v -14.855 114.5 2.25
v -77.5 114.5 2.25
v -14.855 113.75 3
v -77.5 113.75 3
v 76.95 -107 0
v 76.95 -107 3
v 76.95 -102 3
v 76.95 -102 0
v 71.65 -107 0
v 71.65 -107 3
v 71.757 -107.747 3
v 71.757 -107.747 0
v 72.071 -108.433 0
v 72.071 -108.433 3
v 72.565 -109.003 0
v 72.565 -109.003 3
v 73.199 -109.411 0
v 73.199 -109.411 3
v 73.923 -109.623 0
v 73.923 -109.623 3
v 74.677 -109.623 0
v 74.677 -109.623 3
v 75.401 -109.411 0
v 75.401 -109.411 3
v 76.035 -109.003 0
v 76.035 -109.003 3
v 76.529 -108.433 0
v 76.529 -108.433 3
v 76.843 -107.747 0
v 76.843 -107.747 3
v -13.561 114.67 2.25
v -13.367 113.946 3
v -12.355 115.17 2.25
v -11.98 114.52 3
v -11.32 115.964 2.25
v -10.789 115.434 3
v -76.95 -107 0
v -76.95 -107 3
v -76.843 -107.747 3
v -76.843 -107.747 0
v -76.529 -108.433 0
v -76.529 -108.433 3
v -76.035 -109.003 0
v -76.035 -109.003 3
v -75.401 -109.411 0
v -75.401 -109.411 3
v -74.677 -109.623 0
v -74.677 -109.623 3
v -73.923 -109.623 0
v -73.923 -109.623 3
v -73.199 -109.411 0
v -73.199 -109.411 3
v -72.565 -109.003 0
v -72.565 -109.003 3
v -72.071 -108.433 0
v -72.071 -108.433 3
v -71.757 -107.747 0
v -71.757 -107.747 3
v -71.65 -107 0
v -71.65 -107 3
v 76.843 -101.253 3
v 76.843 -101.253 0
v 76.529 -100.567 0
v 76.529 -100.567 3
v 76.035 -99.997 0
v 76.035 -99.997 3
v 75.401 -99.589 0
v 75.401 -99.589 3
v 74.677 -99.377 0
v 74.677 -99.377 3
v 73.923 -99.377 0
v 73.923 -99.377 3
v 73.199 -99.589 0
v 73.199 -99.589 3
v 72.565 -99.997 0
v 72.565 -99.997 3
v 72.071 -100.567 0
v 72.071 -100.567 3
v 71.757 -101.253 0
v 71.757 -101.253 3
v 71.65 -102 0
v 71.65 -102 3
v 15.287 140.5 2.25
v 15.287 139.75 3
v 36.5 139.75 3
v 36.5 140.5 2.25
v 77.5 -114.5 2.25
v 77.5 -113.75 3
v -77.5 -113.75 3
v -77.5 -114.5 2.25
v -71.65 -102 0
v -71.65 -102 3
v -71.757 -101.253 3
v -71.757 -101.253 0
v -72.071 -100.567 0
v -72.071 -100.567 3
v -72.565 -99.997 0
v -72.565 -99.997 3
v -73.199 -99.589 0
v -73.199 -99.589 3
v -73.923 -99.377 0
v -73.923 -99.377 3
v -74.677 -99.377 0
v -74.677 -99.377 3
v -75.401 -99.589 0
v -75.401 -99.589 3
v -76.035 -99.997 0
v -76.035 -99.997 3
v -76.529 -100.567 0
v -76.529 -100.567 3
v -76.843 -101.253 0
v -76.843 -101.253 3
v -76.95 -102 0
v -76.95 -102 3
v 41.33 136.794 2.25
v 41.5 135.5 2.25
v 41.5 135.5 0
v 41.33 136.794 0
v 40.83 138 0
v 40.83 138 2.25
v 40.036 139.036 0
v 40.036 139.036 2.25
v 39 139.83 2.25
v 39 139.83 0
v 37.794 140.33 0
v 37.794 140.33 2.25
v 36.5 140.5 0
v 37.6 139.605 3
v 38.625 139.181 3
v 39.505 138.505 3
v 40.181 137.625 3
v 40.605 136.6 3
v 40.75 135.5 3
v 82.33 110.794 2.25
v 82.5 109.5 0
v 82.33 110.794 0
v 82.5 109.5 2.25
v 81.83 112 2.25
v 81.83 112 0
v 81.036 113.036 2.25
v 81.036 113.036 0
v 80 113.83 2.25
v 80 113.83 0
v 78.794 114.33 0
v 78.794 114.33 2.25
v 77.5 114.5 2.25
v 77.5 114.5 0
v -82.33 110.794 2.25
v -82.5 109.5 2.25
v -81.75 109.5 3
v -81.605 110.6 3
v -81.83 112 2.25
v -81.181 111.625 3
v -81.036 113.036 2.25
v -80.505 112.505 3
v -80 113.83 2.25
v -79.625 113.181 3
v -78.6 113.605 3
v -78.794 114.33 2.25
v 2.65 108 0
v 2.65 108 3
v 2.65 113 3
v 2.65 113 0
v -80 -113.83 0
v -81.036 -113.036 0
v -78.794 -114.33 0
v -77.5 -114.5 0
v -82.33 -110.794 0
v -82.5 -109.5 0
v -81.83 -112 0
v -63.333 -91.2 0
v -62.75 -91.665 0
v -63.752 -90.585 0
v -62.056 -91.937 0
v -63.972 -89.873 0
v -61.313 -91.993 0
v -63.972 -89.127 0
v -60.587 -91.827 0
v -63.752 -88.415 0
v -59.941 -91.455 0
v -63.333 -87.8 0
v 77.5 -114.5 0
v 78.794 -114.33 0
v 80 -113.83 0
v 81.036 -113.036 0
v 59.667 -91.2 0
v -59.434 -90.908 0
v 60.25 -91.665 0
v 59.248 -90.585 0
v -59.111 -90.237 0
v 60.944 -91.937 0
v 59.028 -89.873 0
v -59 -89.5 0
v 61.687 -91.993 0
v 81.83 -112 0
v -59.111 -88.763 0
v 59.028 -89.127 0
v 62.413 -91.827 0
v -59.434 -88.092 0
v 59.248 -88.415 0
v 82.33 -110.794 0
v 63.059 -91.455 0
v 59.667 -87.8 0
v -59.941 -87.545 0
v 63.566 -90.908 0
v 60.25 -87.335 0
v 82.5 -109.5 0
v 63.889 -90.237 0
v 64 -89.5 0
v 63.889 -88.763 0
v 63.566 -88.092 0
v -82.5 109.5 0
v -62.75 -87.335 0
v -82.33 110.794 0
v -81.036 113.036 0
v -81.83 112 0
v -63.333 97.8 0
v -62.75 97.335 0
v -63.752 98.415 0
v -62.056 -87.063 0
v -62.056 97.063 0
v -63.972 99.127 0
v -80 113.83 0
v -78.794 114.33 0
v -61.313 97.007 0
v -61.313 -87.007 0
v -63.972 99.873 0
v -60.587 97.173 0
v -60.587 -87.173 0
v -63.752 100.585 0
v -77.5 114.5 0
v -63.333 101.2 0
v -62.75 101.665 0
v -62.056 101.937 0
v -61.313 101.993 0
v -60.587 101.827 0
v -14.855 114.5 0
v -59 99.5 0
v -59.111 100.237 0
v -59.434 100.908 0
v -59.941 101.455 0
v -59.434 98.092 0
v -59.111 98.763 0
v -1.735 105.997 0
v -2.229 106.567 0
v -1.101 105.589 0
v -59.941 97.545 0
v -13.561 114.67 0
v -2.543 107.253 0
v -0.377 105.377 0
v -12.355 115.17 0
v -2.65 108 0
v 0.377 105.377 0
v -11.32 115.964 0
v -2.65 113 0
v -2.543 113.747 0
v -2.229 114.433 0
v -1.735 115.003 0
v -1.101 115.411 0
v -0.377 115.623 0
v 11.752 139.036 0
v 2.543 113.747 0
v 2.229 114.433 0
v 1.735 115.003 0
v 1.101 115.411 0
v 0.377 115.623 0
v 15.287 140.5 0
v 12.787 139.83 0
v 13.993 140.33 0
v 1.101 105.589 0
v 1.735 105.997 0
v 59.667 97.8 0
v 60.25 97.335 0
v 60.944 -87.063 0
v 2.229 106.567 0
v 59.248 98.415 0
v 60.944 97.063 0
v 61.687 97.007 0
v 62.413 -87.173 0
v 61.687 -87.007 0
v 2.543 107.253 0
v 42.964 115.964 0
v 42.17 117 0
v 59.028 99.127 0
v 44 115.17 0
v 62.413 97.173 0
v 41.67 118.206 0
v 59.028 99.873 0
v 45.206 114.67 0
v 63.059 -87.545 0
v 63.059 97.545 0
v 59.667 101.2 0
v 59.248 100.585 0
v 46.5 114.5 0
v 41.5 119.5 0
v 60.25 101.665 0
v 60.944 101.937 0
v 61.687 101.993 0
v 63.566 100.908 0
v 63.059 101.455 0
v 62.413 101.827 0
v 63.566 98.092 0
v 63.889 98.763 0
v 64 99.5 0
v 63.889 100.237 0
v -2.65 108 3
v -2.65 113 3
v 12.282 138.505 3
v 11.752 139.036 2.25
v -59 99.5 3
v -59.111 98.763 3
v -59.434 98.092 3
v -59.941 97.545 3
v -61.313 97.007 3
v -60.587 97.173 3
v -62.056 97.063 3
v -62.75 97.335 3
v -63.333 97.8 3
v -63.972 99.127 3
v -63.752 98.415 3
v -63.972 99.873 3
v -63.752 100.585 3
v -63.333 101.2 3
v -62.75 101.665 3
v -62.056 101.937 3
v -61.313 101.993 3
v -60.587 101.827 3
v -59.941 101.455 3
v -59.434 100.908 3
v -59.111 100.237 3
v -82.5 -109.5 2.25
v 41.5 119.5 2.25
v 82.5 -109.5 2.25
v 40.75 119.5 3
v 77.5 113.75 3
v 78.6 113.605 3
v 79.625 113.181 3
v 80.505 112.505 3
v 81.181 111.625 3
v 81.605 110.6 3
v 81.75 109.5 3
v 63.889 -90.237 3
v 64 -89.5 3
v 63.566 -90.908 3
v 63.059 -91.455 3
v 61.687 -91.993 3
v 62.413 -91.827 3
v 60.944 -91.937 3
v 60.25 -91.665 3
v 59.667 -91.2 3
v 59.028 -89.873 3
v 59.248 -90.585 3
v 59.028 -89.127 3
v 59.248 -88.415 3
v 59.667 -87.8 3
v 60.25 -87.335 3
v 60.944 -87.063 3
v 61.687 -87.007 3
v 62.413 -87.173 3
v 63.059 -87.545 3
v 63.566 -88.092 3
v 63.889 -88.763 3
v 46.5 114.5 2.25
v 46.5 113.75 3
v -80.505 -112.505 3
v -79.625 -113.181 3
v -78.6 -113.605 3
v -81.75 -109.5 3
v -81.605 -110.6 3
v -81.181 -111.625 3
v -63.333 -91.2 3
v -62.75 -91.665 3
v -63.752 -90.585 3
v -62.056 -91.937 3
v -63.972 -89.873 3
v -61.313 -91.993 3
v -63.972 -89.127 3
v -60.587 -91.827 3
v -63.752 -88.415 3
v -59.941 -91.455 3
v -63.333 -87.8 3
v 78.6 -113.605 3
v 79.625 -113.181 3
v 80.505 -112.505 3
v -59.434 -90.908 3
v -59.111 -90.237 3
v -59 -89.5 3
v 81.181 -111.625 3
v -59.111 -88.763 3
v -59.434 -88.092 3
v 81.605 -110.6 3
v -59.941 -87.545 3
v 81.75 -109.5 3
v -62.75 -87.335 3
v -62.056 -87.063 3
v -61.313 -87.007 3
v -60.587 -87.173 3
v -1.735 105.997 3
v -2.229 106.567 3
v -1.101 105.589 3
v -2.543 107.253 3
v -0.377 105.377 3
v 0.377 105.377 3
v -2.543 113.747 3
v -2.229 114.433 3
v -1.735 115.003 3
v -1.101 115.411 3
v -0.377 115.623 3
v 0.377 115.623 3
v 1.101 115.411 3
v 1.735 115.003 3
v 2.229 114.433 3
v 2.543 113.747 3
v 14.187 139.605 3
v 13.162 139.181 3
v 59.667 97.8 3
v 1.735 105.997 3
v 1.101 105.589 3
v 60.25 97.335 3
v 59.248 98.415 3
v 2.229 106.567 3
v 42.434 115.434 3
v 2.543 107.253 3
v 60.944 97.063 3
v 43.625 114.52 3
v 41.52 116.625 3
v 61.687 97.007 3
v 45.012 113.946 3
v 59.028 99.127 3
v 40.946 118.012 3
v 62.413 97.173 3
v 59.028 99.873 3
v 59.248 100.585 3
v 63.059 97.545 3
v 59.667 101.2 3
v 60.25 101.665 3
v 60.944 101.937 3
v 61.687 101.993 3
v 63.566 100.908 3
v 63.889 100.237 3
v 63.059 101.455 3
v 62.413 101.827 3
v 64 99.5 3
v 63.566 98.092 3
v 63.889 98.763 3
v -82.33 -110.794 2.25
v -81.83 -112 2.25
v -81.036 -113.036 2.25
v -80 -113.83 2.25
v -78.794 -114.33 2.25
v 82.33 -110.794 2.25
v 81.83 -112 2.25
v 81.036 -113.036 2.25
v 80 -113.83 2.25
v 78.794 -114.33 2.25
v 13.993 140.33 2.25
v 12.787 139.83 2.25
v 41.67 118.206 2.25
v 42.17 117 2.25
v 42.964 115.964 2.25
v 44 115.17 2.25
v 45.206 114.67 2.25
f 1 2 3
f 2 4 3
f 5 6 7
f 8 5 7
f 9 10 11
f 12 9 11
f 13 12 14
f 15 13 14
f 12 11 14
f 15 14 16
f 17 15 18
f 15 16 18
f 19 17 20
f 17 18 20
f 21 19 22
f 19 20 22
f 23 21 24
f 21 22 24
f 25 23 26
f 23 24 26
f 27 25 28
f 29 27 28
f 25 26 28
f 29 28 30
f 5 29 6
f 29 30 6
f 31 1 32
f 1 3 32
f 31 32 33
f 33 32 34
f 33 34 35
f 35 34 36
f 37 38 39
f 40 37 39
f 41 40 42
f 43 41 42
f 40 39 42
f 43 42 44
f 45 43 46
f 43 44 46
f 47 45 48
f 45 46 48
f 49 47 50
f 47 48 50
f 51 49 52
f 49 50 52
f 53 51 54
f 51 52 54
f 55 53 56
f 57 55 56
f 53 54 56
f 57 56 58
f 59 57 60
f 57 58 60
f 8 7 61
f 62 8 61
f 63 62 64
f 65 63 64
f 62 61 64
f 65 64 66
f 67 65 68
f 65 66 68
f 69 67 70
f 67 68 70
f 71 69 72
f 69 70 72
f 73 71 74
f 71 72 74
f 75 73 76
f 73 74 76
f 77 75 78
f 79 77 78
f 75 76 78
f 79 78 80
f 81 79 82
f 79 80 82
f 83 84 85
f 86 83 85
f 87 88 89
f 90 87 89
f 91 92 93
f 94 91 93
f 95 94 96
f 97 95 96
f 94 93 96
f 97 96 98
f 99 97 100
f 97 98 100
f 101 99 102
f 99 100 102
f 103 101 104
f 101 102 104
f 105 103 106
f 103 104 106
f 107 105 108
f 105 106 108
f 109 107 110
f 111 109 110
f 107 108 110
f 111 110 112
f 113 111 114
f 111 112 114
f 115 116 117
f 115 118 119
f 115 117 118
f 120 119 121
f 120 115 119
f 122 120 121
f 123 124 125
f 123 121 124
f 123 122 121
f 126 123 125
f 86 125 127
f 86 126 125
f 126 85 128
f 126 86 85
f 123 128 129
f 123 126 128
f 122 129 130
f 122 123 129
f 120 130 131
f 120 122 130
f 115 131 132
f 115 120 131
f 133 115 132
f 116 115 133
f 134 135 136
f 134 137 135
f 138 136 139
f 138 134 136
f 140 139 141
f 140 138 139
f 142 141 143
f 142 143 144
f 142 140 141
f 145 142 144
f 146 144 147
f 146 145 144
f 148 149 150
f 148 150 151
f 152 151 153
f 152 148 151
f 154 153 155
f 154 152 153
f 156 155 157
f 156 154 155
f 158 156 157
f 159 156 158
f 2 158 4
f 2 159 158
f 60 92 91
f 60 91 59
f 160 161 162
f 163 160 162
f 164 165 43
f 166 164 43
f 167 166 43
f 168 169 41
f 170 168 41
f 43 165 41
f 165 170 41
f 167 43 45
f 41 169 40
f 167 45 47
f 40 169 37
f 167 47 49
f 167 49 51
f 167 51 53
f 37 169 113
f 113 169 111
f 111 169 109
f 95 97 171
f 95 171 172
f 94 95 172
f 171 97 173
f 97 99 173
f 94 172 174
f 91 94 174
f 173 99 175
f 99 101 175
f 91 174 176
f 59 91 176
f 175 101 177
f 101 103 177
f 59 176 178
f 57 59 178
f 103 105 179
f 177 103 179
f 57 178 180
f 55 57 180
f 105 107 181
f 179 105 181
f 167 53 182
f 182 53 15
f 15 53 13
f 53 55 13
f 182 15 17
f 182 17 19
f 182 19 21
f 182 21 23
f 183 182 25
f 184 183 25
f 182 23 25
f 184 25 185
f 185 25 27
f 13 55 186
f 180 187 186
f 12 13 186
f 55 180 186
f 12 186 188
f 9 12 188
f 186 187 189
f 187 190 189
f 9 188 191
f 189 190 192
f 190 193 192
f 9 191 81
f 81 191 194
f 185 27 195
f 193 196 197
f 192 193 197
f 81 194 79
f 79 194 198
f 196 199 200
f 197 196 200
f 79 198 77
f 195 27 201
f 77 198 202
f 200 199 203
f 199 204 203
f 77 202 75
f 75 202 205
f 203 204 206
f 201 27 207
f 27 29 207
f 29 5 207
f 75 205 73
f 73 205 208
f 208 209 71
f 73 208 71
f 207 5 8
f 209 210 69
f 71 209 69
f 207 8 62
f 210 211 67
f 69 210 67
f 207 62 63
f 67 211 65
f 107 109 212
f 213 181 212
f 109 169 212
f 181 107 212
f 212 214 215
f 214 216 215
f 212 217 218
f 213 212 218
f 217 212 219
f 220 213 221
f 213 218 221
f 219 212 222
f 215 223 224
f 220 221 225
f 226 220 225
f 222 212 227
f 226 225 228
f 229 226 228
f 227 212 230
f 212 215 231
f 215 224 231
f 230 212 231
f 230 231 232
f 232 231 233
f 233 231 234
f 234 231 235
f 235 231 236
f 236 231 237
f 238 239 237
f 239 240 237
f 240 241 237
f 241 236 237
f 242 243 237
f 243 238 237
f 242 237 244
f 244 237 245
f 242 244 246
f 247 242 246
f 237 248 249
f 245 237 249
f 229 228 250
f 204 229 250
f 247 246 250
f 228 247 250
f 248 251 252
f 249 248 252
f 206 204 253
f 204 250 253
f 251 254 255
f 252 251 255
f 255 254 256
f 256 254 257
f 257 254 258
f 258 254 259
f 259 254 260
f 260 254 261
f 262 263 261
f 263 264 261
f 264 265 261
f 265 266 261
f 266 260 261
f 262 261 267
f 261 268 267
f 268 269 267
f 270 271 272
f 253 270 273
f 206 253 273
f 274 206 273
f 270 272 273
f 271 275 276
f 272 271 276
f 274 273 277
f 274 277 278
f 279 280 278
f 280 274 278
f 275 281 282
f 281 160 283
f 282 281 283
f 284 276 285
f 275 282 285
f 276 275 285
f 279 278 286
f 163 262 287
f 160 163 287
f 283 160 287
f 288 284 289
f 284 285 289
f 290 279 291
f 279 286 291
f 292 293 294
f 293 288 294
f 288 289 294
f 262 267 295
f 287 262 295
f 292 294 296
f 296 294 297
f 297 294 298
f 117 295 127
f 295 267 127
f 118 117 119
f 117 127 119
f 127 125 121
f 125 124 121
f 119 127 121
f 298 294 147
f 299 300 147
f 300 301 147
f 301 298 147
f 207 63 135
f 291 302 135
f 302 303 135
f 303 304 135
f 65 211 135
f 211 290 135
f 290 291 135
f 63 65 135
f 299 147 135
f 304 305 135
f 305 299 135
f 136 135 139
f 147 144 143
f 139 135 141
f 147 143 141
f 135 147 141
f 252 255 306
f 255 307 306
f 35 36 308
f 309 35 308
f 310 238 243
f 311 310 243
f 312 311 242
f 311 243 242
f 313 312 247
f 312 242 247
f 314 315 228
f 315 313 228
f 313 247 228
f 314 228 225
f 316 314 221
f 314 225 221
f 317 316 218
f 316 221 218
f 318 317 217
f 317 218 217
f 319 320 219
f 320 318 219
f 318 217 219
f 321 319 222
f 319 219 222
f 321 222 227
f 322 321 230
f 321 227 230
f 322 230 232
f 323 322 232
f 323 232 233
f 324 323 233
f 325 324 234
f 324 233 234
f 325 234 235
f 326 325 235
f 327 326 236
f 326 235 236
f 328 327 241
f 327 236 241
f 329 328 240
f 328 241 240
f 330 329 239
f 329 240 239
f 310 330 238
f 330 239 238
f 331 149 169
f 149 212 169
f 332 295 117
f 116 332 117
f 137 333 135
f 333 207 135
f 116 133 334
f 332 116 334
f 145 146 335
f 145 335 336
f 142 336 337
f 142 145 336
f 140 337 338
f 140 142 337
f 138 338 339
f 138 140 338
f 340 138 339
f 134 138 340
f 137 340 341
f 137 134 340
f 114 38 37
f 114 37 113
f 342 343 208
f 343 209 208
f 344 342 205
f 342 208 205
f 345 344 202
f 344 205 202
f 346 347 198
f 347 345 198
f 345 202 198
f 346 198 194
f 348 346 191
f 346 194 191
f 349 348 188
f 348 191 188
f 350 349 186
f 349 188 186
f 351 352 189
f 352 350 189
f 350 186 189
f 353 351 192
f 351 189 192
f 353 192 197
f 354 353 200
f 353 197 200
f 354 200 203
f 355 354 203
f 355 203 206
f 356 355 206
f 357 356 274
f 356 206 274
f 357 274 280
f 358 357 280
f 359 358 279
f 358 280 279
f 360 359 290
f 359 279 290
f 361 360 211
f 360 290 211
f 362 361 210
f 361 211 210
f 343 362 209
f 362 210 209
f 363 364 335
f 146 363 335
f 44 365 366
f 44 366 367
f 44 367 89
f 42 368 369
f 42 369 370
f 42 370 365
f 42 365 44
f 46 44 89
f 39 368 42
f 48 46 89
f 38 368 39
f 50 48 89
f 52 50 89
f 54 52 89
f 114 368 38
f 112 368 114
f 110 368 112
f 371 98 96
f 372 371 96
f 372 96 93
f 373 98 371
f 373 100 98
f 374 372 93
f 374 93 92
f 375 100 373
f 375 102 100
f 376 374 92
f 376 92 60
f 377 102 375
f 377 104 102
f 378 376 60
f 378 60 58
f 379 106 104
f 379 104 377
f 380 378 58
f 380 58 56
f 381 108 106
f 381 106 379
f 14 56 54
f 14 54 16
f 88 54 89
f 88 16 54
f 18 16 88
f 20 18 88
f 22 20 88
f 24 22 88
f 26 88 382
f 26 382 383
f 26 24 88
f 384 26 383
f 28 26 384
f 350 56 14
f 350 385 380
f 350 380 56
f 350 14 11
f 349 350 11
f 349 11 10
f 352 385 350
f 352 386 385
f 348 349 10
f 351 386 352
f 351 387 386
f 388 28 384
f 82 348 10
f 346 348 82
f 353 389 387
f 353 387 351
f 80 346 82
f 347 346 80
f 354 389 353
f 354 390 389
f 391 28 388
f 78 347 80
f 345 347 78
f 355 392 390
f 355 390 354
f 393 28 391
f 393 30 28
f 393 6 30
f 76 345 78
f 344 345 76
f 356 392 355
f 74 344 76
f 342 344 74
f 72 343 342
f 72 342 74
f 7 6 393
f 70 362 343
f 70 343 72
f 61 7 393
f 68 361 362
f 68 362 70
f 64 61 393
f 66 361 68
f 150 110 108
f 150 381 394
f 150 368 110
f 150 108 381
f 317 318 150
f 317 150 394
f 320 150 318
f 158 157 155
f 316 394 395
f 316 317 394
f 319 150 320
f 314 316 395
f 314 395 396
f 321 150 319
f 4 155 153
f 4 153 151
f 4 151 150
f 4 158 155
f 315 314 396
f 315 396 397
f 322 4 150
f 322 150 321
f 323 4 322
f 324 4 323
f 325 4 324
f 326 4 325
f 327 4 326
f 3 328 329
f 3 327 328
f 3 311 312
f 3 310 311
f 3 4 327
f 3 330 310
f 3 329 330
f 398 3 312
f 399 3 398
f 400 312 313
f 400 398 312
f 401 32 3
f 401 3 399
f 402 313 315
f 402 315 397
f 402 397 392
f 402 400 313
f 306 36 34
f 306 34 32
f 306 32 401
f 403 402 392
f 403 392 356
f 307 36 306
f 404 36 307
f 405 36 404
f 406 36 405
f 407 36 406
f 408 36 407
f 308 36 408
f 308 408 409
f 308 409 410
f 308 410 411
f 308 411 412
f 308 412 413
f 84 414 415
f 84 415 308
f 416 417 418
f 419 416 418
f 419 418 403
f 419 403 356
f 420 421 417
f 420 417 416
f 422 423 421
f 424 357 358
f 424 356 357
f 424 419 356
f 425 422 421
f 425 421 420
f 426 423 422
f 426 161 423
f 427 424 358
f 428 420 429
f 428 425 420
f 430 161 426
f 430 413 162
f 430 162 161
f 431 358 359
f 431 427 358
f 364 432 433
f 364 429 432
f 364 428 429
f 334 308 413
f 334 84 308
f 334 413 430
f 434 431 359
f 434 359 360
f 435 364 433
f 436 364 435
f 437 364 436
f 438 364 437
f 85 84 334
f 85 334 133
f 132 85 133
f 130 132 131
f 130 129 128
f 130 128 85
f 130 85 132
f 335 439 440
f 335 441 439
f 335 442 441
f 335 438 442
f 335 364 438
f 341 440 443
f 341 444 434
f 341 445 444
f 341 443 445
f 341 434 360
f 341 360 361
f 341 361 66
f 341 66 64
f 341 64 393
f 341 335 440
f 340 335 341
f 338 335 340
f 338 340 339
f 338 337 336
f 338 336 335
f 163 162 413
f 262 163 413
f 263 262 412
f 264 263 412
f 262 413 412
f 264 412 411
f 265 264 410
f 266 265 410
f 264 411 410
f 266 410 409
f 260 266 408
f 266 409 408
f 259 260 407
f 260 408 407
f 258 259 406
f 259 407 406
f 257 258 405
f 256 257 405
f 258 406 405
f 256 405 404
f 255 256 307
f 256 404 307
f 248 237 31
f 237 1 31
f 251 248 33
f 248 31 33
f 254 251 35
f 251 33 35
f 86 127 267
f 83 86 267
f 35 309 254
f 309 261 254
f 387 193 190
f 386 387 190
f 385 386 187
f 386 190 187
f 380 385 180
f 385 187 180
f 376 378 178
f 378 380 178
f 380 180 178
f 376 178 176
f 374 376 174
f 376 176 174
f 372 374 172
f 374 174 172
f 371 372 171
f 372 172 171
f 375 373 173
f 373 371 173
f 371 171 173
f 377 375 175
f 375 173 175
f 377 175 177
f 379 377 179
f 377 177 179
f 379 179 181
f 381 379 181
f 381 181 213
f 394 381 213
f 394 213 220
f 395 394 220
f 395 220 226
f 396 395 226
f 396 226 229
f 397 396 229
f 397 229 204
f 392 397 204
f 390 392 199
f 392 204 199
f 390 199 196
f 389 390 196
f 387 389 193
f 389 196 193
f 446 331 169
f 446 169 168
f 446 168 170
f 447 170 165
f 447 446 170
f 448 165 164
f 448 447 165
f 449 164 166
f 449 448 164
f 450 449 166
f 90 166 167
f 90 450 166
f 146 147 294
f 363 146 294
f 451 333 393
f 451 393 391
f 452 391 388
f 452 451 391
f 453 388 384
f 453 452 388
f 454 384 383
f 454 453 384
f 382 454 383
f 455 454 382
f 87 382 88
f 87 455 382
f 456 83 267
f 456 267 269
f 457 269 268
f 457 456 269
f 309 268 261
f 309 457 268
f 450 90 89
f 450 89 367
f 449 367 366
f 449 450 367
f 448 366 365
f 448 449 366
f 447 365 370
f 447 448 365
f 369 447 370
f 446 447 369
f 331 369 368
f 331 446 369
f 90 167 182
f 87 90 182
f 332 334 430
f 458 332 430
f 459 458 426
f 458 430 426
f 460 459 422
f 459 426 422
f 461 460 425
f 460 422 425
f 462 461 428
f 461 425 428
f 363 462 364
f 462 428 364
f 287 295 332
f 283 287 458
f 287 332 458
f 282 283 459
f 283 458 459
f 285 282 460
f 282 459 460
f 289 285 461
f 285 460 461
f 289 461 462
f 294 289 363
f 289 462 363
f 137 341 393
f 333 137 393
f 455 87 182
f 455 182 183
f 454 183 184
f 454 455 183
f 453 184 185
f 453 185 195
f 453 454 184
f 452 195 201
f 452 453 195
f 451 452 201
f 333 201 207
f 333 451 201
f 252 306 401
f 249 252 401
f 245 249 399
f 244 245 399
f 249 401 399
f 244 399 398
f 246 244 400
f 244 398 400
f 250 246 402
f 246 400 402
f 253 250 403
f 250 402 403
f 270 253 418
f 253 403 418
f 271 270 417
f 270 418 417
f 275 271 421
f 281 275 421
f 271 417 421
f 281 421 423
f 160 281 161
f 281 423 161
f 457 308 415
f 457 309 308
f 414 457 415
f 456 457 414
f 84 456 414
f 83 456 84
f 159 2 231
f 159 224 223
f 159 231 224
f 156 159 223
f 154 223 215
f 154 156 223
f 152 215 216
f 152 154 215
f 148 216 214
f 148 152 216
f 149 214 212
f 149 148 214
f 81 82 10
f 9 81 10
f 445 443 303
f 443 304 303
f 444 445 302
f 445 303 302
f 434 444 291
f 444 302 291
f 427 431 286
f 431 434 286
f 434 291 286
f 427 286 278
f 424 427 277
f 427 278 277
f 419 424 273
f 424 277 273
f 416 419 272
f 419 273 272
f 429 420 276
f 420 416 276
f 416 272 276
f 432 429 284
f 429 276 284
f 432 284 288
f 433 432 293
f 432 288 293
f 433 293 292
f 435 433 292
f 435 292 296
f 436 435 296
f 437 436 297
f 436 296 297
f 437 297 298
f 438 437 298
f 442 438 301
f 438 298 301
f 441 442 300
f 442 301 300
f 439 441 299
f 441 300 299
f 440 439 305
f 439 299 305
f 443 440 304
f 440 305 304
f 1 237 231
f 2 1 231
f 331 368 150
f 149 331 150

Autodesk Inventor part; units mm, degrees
ref_plane "YZ Plane" through (0, 0, 0) normal (1, 0, 0) x (0, 1, 0)
ref_plane "XZ Plane" through (0, 0, 0) normal (0, 1, 0) x (-1, 0, 0)
ref_plane "XY Plane" through (0, 0, 0) normal (0, 0, 1) x (1, 0, 0)
sketch "Sketch1" plane through (0, 0, 0) normal (0, 0, 1) x (1, 0, 0)
  line L0 (-82.5, -114.5) -> (82.5, -114.5)
  line L1 (82.5, -114.5) -> (82.5, 114.5)
  line L2 (82.5, 114.5) -> (-82.5, 114.5)
  line L3 (-82.5, 114.5) -> (-82.5, -114.5)
  line L4 (-82.5, -114.5) -> (82.5, 114.5) construction
  line L5 (82.5, -114.5) -> (-82.5, 114.5) construction
  circle A0 centre (61.5, 99.5) radius 2.5
  line L6 (-147.2223, 0) -> (154.3177, 0) construction
  line L7 (-104.1452, 5) -> (111.2405, 5) construction
  circle A1 centre (61.5, -89.5) radius 2.5
  line L8 (0, 191.5) -> (0, -165.5) construction
  circle A2 centre (-61.5, 99.5) radius 2.5
  circle A3 centre (-61.5, -89.5) radius 2.5
  line L9 (41.5, 114.5) -> (41.5, 140.5)
  line L10 (41.5, 140.5) -> (13.216, 140.5)
  line L11 (13.216, 140.5) -> (-12.784, 114.5)
  point P0 (0, 0)
  dimension "d0" = 229
  dimension "d1" = 165
  dimension "d3" = 5
  dimension "d5" = 189
  dimension "d6" = 25
  dimension "d9" = 61.5
  dimension "d31" = 41
  dimension "d32" = 26
  dimension "d33" = 135
  dimension "d34" = 28.284
extrude "Plate1" add sketch "Sketch1" along normal blind 3
fillet "Fillet1" radius 5 4 edges at (-82.5, 114.5, 1.5) (82.5, 114.5, 1.5) (82.5, -114.5, 1.5) (-82.5, -114.5, 1.5)
sketch "Sketch2" plane through (0, 0, 3) normal (0, 0, 1) x (1, 0, 0)
  line L0 (-74.3, -107) -> (-74.3, -102) construction
  line L1 (-76.95, -107) -> (-76.95, -102)
  line L2 (-71.65, -102) -> (-71.65, -107)
  arc A0 (-76.95, -107) -> (-71.65, -107) centre (-74.3, -107) ccw
  arc A1 (-71.65, -102) -> (-76.95, -102) centre (-74.3, -102) ccw
  line L3 (-103.0799, -19.5) -> (98.9164, -19.5) construction
  line L4 (0, 191.5) -> (0, -165.5) construction
  line L5 (-82.5, -109.5) -> (-82.5, 109.5) construction
  line L6 (74.3, -107) -> (74.3, -102) construction
  line L7 (76.95, -107) -> (76.95, -102)
  line L8 (71.65, -102) -> (71.65, -107)
  arc A2 (71.65, -107) -> (76.95, -107) centre (74.3, -107) ccw
  arc A3 (76.95, -102) -> (71.65, -102) centre (74.3, -102) ccw
  line L9 (77.5, -114.5) -> (-77.5, -114.5) projected
  line L10 (0, 113) -> (0, 108) construction
  line L11 (-2.65, 113) -> (-2.65, 108)
  line L12 (2.65, 108) -> (2.65, 113)
  arc A4 (2.65, 113) -> (-2.65, 113) centre (0, 113) ccw
  arc A5 (-2.65, 108) -> (2.65, 108) centre (0, 108) ccw
  line L13 (-77.5, 114.5) -> (77.5, 114.5) projected
  point P0 (0, 0)
  point P1 (-74.3, -104.5)
  point P2 (74.3, -104.5)
  point P3 (82.5, -109.5)
  point P4 (0, 110.5)
  dimension "d12" = 85
  dimension "d14" = 5
  dimension "d15" = 2.65
  dimension "d18" = 10
  dimension "d22" = 148.6
  dimension "d23" = 5
  dimension "d24" = 2.65
  dimension "d26" = 225
extrude "Cut1" cut sketch "Sketch2" against normal blind 3
fillet "Fillet2" radius 5 4 edges at (41.5, 114.5, 1.5) (41.5, 140.5, 1.5) (13.216, 140.5, 1.5) (-12.784, 114.5, 1.5)
chamfer "Chamfer1" distance 0.75 angle 45 14 edges at (0, -114.5, 3) (-81.0355, -113.0355, 3) (-82.5, 0, 3) (-81.0355, 113.0355, 3) (-46.1775, 114.5, 3) (13.3737, 140.1194, 3) (40.0355, 139.0355, 3) (0.216, 127.5, 3) (25.8935, 140.5, 3) (41.5, 127.5, 3) (62, 114.5, 3) (81.0355, 113.0355, 3) (82.5, 0, 3) (81.0355, -113.0355, 3)
sketch "Sketch4" plane through (0, 0, 3) normal (0, 0, 1) x (1, 0, 0)
  circle A0 centre (85, -108.7631) radius 2
  line L0 (82.5, -109.5) -> (82.5, 109.5) projected
  point P0 (0, 0)
  dimension "d35" = 2.5
  dimension "d36" = 4
equation "\"d18\" = d13"
equation "\"d3\" = d2"
equation "\"d15\" = d24"
equation "\"d23\" = d14"
equation "\"d16\" = Thickness"
equation "\"d10\" = Thickness"
equation "\"BendRadius\" = Thickness"
equation "\"BendReliefWidth\" = Thickness"
equation "\"BendReliefDepth\" = 0.5 * Thickness"
equation "\"CornerReliefSize\" = 4 * Thickness"
equation "\"MinimumRemnant\" = 2 * Thickness"
equation "\"TransitionRadius\" = BendRadius"
equation "\"JacobiRadiusSize\" = BendRadius"
equation "\"GapSize\" = Thickness"
equation "\"d2\" = 5"
equation "\"Thickness\" = 3"
equation "\"d13\" = 10"
properties part number "TBD_Box_Fix"
